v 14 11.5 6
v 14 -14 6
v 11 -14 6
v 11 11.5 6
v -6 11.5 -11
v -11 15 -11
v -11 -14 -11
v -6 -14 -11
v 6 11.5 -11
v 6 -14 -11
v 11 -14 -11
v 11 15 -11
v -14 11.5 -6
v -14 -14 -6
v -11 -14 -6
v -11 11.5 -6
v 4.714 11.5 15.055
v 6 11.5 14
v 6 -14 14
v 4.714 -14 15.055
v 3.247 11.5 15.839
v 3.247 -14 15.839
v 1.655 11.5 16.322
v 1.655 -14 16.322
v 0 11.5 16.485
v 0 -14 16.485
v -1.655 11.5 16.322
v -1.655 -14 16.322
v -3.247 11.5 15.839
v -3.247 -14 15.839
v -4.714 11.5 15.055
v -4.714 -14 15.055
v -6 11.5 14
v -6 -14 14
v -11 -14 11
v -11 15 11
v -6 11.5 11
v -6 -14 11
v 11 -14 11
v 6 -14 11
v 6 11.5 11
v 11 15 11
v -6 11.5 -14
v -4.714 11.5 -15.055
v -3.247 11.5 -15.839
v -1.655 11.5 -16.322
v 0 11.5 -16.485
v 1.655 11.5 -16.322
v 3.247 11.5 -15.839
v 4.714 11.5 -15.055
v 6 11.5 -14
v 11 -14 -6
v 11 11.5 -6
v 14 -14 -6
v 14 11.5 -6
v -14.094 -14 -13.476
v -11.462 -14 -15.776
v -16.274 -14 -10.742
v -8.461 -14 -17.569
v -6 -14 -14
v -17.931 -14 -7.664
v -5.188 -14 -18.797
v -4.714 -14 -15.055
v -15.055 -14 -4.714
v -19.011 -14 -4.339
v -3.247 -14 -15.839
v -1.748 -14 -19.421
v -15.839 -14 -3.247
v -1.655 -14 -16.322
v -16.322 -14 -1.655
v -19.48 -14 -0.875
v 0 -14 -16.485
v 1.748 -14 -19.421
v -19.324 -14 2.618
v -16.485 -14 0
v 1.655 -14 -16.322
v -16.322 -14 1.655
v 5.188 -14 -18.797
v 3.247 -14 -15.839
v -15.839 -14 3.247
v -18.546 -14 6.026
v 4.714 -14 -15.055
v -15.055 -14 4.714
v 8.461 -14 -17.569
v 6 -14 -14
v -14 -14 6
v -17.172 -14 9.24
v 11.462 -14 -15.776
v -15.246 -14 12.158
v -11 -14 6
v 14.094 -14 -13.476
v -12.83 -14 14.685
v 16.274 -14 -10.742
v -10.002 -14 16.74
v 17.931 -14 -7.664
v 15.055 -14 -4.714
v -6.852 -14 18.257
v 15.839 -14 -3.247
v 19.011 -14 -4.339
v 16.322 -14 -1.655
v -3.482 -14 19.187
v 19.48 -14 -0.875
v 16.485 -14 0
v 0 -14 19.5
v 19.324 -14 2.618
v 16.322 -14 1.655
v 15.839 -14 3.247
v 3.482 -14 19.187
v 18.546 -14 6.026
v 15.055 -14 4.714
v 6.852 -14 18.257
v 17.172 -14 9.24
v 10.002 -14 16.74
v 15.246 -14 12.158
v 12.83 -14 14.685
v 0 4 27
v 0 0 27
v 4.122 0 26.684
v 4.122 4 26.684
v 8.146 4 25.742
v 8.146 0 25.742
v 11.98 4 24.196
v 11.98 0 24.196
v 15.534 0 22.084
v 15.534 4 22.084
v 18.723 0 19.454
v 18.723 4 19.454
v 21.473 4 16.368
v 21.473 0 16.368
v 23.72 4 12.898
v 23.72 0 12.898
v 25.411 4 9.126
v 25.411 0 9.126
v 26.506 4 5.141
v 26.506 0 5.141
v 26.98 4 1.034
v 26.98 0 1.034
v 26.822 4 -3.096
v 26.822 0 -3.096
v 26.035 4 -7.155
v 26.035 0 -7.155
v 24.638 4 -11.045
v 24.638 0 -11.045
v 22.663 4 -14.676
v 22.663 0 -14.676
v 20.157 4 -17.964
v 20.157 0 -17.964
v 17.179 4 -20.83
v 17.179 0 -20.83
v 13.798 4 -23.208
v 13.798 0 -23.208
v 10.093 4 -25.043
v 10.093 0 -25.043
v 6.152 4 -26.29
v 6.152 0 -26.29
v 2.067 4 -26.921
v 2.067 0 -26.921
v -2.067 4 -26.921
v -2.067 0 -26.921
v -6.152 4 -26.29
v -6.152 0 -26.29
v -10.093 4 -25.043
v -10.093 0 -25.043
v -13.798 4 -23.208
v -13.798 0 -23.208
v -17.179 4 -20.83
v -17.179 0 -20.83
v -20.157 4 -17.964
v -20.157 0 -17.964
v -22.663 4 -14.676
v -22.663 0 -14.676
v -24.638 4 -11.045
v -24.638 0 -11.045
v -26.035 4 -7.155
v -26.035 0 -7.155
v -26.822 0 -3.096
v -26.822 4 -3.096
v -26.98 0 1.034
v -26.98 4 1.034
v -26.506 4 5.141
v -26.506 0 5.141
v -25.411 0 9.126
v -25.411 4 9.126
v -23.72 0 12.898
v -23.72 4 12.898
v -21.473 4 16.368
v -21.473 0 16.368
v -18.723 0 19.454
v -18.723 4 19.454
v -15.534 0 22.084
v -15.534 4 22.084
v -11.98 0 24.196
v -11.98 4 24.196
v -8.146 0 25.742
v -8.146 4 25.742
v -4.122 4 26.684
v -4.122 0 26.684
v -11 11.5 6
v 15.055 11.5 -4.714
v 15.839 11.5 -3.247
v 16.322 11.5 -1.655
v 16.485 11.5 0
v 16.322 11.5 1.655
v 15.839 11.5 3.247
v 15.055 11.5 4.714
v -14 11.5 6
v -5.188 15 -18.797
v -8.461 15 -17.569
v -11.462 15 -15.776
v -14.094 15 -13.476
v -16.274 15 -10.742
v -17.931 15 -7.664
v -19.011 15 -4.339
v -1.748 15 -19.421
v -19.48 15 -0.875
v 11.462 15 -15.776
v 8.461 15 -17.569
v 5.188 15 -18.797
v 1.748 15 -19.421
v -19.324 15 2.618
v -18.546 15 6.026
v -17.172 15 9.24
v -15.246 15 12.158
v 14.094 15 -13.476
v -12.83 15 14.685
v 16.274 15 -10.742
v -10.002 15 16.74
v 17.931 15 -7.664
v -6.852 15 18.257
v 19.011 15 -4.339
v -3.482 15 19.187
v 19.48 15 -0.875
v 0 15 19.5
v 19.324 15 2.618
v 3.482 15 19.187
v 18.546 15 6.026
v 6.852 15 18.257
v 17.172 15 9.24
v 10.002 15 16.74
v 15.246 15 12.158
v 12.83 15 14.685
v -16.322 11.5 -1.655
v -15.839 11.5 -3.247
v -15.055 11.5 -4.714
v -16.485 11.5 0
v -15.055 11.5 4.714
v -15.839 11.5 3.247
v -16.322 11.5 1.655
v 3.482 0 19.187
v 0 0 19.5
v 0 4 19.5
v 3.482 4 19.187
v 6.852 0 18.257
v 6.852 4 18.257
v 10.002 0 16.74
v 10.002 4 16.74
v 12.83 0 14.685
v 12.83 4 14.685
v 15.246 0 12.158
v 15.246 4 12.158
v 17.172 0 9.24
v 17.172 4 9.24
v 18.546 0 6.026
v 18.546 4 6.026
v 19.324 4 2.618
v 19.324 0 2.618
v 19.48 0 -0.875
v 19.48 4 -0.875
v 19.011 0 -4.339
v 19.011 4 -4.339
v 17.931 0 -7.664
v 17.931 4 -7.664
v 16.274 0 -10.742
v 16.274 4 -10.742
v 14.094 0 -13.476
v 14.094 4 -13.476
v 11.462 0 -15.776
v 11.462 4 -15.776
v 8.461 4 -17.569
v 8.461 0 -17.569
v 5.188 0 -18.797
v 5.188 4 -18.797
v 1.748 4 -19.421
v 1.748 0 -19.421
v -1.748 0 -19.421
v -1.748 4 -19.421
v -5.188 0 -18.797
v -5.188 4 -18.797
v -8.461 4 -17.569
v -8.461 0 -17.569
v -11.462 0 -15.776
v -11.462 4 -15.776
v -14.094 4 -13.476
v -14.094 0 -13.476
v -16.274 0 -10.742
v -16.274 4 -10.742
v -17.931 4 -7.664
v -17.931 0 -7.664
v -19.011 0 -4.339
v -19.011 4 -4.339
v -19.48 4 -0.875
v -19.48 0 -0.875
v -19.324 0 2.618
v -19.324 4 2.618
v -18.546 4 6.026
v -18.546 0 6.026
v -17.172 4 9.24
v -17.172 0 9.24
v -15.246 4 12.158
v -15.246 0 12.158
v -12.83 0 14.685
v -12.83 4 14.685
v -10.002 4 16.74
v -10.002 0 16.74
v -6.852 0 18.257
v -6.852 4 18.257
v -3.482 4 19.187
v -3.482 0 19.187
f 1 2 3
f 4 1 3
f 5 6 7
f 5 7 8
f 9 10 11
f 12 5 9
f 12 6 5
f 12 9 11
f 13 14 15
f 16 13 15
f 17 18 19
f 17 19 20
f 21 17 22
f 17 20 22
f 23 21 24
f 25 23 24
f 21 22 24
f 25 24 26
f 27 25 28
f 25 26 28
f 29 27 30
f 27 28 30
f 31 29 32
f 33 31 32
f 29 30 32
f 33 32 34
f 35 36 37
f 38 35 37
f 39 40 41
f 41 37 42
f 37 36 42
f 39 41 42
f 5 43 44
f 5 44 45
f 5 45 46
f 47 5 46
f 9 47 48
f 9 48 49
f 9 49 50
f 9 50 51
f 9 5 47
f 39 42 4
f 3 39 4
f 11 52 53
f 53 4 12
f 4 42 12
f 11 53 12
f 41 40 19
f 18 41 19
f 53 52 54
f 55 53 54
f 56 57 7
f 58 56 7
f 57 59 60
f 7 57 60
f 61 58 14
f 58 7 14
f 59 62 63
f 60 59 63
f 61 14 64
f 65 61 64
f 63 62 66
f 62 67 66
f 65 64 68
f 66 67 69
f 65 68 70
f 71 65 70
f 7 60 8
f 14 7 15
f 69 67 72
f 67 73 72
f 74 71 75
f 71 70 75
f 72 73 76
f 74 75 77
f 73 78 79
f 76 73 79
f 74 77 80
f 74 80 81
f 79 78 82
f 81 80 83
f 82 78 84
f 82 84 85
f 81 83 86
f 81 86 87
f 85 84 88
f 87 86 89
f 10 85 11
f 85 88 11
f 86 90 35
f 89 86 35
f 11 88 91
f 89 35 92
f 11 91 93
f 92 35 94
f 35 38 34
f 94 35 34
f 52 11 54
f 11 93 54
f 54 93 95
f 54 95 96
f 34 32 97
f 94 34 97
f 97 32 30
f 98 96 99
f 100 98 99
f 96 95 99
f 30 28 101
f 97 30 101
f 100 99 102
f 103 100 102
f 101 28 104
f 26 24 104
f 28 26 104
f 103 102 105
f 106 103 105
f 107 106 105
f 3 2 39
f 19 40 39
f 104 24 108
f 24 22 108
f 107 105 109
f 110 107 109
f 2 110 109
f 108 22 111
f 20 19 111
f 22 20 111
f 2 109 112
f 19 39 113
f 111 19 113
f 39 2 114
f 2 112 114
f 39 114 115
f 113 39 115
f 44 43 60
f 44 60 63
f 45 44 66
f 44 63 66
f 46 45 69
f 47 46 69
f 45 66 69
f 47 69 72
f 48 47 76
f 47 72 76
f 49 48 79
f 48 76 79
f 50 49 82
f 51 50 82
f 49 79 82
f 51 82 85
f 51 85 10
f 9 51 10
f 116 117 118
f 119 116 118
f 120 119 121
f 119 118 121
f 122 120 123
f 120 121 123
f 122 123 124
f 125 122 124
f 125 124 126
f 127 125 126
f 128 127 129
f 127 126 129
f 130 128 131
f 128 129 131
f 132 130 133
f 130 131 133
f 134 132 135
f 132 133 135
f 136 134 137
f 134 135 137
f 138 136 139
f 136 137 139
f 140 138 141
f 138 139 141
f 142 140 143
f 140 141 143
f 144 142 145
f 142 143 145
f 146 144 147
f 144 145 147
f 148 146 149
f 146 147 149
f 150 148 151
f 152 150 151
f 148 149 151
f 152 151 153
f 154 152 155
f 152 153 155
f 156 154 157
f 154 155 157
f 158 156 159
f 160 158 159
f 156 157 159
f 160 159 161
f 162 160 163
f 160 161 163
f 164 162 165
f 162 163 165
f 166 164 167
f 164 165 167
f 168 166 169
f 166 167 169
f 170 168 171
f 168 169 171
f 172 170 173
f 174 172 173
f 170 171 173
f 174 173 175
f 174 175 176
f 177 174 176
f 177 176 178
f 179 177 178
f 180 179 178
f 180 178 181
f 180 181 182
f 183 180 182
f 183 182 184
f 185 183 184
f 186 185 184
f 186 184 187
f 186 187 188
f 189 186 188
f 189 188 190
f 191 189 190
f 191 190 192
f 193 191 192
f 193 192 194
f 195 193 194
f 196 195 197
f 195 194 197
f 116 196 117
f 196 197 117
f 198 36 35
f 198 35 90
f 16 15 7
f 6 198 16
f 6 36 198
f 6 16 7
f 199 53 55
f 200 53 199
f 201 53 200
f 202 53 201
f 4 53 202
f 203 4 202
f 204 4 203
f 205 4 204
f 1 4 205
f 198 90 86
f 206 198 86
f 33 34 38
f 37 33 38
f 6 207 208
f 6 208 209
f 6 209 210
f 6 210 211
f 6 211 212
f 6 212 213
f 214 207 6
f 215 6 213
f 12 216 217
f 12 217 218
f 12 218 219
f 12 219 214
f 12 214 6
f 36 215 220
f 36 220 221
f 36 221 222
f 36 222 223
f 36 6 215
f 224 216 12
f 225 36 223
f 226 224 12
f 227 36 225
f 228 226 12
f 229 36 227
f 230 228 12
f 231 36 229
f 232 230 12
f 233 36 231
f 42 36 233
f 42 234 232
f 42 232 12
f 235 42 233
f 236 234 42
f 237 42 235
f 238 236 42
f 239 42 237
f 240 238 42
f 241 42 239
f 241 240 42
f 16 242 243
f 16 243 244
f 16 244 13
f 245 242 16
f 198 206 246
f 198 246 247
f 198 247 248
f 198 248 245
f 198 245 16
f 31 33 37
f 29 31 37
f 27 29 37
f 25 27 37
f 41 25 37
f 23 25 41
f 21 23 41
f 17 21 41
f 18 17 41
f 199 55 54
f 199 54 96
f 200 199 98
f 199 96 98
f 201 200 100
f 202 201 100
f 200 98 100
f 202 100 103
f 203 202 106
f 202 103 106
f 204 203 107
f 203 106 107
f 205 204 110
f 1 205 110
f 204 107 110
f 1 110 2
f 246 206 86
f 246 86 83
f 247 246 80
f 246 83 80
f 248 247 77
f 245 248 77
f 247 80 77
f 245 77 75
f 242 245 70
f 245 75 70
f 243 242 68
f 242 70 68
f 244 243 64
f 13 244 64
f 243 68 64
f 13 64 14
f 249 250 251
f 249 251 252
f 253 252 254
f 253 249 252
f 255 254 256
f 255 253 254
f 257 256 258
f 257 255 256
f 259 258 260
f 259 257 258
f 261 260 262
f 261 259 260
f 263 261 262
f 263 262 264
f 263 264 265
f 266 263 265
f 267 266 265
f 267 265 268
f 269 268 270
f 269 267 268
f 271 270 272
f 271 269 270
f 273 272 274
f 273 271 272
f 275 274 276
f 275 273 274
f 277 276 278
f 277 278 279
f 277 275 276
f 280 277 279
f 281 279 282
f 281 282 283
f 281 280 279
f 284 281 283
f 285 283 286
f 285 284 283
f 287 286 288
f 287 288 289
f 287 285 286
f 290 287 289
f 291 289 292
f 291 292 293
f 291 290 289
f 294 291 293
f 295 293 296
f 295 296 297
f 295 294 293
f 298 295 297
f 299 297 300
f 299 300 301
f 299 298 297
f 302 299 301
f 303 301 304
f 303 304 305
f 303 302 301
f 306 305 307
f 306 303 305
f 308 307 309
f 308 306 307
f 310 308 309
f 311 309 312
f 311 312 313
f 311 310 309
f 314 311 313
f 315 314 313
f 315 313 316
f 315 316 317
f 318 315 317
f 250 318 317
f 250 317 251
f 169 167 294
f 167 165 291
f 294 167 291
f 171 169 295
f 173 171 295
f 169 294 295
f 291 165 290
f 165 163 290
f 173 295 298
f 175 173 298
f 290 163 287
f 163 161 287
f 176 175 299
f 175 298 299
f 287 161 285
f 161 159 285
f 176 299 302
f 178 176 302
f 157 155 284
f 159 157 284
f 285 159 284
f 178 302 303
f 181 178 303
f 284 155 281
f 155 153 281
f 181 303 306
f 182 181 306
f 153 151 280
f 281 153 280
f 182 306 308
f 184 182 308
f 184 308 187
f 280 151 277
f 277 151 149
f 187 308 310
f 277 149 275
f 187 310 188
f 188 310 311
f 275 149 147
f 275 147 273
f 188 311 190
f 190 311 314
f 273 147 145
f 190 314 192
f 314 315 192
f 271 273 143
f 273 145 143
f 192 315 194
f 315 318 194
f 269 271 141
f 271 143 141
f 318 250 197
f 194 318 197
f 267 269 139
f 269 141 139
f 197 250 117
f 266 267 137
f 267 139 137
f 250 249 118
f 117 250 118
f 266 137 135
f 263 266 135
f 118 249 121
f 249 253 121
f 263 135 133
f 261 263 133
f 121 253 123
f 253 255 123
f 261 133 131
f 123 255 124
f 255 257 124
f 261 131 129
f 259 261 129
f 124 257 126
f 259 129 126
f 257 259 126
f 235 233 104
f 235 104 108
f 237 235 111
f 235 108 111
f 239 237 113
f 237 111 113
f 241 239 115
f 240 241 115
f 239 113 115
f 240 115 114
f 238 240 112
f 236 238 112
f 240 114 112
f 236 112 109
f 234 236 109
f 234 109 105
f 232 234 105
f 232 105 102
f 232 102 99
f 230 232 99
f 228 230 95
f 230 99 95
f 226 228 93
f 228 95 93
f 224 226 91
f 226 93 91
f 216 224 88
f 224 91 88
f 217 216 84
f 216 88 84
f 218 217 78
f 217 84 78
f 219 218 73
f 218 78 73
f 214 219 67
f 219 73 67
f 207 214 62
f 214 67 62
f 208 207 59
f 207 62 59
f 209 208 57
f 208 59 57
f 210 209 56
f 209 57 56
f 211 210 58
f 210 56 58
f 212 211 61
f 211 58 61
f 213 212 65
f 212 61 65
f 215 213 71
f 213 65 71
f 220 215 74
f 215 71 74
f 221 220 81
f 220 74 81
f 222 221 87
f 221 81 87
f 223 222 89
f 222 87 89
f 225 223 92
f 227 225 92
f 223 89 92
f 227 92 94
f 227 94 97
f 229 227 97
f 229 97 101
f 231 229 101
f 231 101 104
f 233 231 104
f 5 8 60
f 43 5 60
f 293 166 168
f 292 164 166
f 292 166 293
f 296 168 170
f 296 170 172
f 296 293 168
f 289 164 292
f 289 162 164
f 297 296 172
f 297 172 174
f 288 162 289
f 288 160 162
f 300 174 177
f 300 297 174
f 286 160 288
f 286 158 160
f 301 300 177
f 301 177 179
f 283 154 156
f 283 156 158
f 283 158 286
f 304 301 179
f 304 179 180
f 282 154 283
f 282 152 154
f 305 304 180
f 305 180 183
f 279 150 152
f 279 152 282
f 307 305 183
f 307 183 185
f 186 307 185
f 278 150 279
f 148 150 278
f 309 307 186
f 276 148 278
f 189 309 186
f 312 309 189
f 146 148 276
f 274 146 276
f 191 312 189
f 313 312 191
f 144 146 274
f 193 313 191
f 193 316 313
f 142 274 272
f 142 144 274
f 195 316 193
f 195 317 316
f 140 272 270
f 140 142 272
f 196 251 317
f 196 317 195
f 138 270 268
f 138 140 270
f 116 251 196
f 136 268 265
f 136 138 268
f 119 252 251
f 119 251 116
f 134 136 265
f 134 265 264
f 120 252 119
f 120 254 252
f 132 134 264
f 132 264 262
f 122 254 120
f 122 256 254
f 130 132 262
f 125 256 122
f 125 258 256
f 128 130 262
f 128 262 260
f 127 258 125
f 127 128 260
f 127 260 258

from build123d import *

# Parameters (mm, degrees)
SKETCH1_R                = 27
SKETCH1_R_2              = 19.5
BOSS_EXTRUDE1_DEPTH      = 4
BOSS_EXTRUDE2_DEPTH      = 11
BOSS_EXTRUDE2_DEPTH_BACK = 18
SKETCH2_R                = 19.5
SKETCH3_W                = 22
SKETCH3_H                = 22
CUT_EXTRUDE1_DEPTH       = 29
CUT_EXTRUDE2_DEPTH       = 25.5


with BuildPart() as part:
    # Sketch1 → Boss-Extrude1 (new body)
    with BuildSketch(Plane(origin=(0, 0, 0), x_dir=(1, 0, 0), z_dir=(0, 1, 0))):
        with Locations(Location((0, 0, 0), (0, 0, 270))):
            Circle(SKETCH1_R)
        with Locations(Location((0, 0, 0), (0, 0, 270))):
            Circle(SKETCH1_R_2, mode=Mode.SUBTRACT)
    extrude(amount=BOSS_EXTRUDE1_DEPTH)


with BuildPart() as body_2:
    # Sketch2 → Boss-Extrude2 (new, two sides: drawn at the far end of the back side and taken through both)
    with BuildSketch(Plane(origin=(0, 4, 0), x_dir=(1, 0, 0), z_dir=(0, 1, 0)).offset(-BOSS_EXTRUDE2_DEPTH_BACK)):
        with Locations(Location((0, 0, 0), (0, 0, 270))):
            Circle(SKETCH2_R)
    extrude(amount=BOSS_EXTRUDE2_DEPTH + BOSS_EXTRUDE2_DEPTH_BACK)

    # Sketch3 → Cut-Extrude1 (cut)
    with BuildSketch(Plane(origin=(0, 15, 0), x_dir=(1, 0, 0), z_dir=(0, 1, 0))):
        Rectangle(SKETCH3_W, SKETCH3_H)
    extrude(amount=-CUT_EXTRUDE1_DEPTH, mode=Mode.SUBTRACT)

    # Sketch4 → Cut-Extrude2 (cut)
    with BuildSketch(Plane.XZ.offset(14)):
        with BuildLine():
            Line((11, 6), (11, -6))
            Line((11, -6), (14, -6))
            ThreePointArc((14, -6), (16.485281374, 0), (14, 6))
            Line((14, 6), (11, 6))
        make_face()
        with BuildLine():
            Line((-6, 11), (6, 11))
            Line((6, 11), (6, 14))
            ThreePointArc((6, 14), (0, 16.485281374), (-6, 14))
            Line((-6, 14), (-6, 11))
        make_face()
        with BuildLine():
            Line((6, -11), (-6, -11))
            Line((-6, -11), (-6, -14))
            ThreePointArc((-6, -14), (0, -16.485281374), (6, -14))
            Line((6, -14), (6, -11))
        make_face()
        with BuildLine():
            Line((-11, -6), (-11, 6))
            Line((-11, 6), (-14, 6))
            ThreePointArc((-14, 6), (-16.485281374, 0), (-14, -6))
            Line((-14, -6), (-11, -6))
        make_face()
    extrude(amount=-CUT_EXTRUDE2_DEPTH, mode=Mode.SUBTRACT)


solid = Compound([part.part, body_2.part])
